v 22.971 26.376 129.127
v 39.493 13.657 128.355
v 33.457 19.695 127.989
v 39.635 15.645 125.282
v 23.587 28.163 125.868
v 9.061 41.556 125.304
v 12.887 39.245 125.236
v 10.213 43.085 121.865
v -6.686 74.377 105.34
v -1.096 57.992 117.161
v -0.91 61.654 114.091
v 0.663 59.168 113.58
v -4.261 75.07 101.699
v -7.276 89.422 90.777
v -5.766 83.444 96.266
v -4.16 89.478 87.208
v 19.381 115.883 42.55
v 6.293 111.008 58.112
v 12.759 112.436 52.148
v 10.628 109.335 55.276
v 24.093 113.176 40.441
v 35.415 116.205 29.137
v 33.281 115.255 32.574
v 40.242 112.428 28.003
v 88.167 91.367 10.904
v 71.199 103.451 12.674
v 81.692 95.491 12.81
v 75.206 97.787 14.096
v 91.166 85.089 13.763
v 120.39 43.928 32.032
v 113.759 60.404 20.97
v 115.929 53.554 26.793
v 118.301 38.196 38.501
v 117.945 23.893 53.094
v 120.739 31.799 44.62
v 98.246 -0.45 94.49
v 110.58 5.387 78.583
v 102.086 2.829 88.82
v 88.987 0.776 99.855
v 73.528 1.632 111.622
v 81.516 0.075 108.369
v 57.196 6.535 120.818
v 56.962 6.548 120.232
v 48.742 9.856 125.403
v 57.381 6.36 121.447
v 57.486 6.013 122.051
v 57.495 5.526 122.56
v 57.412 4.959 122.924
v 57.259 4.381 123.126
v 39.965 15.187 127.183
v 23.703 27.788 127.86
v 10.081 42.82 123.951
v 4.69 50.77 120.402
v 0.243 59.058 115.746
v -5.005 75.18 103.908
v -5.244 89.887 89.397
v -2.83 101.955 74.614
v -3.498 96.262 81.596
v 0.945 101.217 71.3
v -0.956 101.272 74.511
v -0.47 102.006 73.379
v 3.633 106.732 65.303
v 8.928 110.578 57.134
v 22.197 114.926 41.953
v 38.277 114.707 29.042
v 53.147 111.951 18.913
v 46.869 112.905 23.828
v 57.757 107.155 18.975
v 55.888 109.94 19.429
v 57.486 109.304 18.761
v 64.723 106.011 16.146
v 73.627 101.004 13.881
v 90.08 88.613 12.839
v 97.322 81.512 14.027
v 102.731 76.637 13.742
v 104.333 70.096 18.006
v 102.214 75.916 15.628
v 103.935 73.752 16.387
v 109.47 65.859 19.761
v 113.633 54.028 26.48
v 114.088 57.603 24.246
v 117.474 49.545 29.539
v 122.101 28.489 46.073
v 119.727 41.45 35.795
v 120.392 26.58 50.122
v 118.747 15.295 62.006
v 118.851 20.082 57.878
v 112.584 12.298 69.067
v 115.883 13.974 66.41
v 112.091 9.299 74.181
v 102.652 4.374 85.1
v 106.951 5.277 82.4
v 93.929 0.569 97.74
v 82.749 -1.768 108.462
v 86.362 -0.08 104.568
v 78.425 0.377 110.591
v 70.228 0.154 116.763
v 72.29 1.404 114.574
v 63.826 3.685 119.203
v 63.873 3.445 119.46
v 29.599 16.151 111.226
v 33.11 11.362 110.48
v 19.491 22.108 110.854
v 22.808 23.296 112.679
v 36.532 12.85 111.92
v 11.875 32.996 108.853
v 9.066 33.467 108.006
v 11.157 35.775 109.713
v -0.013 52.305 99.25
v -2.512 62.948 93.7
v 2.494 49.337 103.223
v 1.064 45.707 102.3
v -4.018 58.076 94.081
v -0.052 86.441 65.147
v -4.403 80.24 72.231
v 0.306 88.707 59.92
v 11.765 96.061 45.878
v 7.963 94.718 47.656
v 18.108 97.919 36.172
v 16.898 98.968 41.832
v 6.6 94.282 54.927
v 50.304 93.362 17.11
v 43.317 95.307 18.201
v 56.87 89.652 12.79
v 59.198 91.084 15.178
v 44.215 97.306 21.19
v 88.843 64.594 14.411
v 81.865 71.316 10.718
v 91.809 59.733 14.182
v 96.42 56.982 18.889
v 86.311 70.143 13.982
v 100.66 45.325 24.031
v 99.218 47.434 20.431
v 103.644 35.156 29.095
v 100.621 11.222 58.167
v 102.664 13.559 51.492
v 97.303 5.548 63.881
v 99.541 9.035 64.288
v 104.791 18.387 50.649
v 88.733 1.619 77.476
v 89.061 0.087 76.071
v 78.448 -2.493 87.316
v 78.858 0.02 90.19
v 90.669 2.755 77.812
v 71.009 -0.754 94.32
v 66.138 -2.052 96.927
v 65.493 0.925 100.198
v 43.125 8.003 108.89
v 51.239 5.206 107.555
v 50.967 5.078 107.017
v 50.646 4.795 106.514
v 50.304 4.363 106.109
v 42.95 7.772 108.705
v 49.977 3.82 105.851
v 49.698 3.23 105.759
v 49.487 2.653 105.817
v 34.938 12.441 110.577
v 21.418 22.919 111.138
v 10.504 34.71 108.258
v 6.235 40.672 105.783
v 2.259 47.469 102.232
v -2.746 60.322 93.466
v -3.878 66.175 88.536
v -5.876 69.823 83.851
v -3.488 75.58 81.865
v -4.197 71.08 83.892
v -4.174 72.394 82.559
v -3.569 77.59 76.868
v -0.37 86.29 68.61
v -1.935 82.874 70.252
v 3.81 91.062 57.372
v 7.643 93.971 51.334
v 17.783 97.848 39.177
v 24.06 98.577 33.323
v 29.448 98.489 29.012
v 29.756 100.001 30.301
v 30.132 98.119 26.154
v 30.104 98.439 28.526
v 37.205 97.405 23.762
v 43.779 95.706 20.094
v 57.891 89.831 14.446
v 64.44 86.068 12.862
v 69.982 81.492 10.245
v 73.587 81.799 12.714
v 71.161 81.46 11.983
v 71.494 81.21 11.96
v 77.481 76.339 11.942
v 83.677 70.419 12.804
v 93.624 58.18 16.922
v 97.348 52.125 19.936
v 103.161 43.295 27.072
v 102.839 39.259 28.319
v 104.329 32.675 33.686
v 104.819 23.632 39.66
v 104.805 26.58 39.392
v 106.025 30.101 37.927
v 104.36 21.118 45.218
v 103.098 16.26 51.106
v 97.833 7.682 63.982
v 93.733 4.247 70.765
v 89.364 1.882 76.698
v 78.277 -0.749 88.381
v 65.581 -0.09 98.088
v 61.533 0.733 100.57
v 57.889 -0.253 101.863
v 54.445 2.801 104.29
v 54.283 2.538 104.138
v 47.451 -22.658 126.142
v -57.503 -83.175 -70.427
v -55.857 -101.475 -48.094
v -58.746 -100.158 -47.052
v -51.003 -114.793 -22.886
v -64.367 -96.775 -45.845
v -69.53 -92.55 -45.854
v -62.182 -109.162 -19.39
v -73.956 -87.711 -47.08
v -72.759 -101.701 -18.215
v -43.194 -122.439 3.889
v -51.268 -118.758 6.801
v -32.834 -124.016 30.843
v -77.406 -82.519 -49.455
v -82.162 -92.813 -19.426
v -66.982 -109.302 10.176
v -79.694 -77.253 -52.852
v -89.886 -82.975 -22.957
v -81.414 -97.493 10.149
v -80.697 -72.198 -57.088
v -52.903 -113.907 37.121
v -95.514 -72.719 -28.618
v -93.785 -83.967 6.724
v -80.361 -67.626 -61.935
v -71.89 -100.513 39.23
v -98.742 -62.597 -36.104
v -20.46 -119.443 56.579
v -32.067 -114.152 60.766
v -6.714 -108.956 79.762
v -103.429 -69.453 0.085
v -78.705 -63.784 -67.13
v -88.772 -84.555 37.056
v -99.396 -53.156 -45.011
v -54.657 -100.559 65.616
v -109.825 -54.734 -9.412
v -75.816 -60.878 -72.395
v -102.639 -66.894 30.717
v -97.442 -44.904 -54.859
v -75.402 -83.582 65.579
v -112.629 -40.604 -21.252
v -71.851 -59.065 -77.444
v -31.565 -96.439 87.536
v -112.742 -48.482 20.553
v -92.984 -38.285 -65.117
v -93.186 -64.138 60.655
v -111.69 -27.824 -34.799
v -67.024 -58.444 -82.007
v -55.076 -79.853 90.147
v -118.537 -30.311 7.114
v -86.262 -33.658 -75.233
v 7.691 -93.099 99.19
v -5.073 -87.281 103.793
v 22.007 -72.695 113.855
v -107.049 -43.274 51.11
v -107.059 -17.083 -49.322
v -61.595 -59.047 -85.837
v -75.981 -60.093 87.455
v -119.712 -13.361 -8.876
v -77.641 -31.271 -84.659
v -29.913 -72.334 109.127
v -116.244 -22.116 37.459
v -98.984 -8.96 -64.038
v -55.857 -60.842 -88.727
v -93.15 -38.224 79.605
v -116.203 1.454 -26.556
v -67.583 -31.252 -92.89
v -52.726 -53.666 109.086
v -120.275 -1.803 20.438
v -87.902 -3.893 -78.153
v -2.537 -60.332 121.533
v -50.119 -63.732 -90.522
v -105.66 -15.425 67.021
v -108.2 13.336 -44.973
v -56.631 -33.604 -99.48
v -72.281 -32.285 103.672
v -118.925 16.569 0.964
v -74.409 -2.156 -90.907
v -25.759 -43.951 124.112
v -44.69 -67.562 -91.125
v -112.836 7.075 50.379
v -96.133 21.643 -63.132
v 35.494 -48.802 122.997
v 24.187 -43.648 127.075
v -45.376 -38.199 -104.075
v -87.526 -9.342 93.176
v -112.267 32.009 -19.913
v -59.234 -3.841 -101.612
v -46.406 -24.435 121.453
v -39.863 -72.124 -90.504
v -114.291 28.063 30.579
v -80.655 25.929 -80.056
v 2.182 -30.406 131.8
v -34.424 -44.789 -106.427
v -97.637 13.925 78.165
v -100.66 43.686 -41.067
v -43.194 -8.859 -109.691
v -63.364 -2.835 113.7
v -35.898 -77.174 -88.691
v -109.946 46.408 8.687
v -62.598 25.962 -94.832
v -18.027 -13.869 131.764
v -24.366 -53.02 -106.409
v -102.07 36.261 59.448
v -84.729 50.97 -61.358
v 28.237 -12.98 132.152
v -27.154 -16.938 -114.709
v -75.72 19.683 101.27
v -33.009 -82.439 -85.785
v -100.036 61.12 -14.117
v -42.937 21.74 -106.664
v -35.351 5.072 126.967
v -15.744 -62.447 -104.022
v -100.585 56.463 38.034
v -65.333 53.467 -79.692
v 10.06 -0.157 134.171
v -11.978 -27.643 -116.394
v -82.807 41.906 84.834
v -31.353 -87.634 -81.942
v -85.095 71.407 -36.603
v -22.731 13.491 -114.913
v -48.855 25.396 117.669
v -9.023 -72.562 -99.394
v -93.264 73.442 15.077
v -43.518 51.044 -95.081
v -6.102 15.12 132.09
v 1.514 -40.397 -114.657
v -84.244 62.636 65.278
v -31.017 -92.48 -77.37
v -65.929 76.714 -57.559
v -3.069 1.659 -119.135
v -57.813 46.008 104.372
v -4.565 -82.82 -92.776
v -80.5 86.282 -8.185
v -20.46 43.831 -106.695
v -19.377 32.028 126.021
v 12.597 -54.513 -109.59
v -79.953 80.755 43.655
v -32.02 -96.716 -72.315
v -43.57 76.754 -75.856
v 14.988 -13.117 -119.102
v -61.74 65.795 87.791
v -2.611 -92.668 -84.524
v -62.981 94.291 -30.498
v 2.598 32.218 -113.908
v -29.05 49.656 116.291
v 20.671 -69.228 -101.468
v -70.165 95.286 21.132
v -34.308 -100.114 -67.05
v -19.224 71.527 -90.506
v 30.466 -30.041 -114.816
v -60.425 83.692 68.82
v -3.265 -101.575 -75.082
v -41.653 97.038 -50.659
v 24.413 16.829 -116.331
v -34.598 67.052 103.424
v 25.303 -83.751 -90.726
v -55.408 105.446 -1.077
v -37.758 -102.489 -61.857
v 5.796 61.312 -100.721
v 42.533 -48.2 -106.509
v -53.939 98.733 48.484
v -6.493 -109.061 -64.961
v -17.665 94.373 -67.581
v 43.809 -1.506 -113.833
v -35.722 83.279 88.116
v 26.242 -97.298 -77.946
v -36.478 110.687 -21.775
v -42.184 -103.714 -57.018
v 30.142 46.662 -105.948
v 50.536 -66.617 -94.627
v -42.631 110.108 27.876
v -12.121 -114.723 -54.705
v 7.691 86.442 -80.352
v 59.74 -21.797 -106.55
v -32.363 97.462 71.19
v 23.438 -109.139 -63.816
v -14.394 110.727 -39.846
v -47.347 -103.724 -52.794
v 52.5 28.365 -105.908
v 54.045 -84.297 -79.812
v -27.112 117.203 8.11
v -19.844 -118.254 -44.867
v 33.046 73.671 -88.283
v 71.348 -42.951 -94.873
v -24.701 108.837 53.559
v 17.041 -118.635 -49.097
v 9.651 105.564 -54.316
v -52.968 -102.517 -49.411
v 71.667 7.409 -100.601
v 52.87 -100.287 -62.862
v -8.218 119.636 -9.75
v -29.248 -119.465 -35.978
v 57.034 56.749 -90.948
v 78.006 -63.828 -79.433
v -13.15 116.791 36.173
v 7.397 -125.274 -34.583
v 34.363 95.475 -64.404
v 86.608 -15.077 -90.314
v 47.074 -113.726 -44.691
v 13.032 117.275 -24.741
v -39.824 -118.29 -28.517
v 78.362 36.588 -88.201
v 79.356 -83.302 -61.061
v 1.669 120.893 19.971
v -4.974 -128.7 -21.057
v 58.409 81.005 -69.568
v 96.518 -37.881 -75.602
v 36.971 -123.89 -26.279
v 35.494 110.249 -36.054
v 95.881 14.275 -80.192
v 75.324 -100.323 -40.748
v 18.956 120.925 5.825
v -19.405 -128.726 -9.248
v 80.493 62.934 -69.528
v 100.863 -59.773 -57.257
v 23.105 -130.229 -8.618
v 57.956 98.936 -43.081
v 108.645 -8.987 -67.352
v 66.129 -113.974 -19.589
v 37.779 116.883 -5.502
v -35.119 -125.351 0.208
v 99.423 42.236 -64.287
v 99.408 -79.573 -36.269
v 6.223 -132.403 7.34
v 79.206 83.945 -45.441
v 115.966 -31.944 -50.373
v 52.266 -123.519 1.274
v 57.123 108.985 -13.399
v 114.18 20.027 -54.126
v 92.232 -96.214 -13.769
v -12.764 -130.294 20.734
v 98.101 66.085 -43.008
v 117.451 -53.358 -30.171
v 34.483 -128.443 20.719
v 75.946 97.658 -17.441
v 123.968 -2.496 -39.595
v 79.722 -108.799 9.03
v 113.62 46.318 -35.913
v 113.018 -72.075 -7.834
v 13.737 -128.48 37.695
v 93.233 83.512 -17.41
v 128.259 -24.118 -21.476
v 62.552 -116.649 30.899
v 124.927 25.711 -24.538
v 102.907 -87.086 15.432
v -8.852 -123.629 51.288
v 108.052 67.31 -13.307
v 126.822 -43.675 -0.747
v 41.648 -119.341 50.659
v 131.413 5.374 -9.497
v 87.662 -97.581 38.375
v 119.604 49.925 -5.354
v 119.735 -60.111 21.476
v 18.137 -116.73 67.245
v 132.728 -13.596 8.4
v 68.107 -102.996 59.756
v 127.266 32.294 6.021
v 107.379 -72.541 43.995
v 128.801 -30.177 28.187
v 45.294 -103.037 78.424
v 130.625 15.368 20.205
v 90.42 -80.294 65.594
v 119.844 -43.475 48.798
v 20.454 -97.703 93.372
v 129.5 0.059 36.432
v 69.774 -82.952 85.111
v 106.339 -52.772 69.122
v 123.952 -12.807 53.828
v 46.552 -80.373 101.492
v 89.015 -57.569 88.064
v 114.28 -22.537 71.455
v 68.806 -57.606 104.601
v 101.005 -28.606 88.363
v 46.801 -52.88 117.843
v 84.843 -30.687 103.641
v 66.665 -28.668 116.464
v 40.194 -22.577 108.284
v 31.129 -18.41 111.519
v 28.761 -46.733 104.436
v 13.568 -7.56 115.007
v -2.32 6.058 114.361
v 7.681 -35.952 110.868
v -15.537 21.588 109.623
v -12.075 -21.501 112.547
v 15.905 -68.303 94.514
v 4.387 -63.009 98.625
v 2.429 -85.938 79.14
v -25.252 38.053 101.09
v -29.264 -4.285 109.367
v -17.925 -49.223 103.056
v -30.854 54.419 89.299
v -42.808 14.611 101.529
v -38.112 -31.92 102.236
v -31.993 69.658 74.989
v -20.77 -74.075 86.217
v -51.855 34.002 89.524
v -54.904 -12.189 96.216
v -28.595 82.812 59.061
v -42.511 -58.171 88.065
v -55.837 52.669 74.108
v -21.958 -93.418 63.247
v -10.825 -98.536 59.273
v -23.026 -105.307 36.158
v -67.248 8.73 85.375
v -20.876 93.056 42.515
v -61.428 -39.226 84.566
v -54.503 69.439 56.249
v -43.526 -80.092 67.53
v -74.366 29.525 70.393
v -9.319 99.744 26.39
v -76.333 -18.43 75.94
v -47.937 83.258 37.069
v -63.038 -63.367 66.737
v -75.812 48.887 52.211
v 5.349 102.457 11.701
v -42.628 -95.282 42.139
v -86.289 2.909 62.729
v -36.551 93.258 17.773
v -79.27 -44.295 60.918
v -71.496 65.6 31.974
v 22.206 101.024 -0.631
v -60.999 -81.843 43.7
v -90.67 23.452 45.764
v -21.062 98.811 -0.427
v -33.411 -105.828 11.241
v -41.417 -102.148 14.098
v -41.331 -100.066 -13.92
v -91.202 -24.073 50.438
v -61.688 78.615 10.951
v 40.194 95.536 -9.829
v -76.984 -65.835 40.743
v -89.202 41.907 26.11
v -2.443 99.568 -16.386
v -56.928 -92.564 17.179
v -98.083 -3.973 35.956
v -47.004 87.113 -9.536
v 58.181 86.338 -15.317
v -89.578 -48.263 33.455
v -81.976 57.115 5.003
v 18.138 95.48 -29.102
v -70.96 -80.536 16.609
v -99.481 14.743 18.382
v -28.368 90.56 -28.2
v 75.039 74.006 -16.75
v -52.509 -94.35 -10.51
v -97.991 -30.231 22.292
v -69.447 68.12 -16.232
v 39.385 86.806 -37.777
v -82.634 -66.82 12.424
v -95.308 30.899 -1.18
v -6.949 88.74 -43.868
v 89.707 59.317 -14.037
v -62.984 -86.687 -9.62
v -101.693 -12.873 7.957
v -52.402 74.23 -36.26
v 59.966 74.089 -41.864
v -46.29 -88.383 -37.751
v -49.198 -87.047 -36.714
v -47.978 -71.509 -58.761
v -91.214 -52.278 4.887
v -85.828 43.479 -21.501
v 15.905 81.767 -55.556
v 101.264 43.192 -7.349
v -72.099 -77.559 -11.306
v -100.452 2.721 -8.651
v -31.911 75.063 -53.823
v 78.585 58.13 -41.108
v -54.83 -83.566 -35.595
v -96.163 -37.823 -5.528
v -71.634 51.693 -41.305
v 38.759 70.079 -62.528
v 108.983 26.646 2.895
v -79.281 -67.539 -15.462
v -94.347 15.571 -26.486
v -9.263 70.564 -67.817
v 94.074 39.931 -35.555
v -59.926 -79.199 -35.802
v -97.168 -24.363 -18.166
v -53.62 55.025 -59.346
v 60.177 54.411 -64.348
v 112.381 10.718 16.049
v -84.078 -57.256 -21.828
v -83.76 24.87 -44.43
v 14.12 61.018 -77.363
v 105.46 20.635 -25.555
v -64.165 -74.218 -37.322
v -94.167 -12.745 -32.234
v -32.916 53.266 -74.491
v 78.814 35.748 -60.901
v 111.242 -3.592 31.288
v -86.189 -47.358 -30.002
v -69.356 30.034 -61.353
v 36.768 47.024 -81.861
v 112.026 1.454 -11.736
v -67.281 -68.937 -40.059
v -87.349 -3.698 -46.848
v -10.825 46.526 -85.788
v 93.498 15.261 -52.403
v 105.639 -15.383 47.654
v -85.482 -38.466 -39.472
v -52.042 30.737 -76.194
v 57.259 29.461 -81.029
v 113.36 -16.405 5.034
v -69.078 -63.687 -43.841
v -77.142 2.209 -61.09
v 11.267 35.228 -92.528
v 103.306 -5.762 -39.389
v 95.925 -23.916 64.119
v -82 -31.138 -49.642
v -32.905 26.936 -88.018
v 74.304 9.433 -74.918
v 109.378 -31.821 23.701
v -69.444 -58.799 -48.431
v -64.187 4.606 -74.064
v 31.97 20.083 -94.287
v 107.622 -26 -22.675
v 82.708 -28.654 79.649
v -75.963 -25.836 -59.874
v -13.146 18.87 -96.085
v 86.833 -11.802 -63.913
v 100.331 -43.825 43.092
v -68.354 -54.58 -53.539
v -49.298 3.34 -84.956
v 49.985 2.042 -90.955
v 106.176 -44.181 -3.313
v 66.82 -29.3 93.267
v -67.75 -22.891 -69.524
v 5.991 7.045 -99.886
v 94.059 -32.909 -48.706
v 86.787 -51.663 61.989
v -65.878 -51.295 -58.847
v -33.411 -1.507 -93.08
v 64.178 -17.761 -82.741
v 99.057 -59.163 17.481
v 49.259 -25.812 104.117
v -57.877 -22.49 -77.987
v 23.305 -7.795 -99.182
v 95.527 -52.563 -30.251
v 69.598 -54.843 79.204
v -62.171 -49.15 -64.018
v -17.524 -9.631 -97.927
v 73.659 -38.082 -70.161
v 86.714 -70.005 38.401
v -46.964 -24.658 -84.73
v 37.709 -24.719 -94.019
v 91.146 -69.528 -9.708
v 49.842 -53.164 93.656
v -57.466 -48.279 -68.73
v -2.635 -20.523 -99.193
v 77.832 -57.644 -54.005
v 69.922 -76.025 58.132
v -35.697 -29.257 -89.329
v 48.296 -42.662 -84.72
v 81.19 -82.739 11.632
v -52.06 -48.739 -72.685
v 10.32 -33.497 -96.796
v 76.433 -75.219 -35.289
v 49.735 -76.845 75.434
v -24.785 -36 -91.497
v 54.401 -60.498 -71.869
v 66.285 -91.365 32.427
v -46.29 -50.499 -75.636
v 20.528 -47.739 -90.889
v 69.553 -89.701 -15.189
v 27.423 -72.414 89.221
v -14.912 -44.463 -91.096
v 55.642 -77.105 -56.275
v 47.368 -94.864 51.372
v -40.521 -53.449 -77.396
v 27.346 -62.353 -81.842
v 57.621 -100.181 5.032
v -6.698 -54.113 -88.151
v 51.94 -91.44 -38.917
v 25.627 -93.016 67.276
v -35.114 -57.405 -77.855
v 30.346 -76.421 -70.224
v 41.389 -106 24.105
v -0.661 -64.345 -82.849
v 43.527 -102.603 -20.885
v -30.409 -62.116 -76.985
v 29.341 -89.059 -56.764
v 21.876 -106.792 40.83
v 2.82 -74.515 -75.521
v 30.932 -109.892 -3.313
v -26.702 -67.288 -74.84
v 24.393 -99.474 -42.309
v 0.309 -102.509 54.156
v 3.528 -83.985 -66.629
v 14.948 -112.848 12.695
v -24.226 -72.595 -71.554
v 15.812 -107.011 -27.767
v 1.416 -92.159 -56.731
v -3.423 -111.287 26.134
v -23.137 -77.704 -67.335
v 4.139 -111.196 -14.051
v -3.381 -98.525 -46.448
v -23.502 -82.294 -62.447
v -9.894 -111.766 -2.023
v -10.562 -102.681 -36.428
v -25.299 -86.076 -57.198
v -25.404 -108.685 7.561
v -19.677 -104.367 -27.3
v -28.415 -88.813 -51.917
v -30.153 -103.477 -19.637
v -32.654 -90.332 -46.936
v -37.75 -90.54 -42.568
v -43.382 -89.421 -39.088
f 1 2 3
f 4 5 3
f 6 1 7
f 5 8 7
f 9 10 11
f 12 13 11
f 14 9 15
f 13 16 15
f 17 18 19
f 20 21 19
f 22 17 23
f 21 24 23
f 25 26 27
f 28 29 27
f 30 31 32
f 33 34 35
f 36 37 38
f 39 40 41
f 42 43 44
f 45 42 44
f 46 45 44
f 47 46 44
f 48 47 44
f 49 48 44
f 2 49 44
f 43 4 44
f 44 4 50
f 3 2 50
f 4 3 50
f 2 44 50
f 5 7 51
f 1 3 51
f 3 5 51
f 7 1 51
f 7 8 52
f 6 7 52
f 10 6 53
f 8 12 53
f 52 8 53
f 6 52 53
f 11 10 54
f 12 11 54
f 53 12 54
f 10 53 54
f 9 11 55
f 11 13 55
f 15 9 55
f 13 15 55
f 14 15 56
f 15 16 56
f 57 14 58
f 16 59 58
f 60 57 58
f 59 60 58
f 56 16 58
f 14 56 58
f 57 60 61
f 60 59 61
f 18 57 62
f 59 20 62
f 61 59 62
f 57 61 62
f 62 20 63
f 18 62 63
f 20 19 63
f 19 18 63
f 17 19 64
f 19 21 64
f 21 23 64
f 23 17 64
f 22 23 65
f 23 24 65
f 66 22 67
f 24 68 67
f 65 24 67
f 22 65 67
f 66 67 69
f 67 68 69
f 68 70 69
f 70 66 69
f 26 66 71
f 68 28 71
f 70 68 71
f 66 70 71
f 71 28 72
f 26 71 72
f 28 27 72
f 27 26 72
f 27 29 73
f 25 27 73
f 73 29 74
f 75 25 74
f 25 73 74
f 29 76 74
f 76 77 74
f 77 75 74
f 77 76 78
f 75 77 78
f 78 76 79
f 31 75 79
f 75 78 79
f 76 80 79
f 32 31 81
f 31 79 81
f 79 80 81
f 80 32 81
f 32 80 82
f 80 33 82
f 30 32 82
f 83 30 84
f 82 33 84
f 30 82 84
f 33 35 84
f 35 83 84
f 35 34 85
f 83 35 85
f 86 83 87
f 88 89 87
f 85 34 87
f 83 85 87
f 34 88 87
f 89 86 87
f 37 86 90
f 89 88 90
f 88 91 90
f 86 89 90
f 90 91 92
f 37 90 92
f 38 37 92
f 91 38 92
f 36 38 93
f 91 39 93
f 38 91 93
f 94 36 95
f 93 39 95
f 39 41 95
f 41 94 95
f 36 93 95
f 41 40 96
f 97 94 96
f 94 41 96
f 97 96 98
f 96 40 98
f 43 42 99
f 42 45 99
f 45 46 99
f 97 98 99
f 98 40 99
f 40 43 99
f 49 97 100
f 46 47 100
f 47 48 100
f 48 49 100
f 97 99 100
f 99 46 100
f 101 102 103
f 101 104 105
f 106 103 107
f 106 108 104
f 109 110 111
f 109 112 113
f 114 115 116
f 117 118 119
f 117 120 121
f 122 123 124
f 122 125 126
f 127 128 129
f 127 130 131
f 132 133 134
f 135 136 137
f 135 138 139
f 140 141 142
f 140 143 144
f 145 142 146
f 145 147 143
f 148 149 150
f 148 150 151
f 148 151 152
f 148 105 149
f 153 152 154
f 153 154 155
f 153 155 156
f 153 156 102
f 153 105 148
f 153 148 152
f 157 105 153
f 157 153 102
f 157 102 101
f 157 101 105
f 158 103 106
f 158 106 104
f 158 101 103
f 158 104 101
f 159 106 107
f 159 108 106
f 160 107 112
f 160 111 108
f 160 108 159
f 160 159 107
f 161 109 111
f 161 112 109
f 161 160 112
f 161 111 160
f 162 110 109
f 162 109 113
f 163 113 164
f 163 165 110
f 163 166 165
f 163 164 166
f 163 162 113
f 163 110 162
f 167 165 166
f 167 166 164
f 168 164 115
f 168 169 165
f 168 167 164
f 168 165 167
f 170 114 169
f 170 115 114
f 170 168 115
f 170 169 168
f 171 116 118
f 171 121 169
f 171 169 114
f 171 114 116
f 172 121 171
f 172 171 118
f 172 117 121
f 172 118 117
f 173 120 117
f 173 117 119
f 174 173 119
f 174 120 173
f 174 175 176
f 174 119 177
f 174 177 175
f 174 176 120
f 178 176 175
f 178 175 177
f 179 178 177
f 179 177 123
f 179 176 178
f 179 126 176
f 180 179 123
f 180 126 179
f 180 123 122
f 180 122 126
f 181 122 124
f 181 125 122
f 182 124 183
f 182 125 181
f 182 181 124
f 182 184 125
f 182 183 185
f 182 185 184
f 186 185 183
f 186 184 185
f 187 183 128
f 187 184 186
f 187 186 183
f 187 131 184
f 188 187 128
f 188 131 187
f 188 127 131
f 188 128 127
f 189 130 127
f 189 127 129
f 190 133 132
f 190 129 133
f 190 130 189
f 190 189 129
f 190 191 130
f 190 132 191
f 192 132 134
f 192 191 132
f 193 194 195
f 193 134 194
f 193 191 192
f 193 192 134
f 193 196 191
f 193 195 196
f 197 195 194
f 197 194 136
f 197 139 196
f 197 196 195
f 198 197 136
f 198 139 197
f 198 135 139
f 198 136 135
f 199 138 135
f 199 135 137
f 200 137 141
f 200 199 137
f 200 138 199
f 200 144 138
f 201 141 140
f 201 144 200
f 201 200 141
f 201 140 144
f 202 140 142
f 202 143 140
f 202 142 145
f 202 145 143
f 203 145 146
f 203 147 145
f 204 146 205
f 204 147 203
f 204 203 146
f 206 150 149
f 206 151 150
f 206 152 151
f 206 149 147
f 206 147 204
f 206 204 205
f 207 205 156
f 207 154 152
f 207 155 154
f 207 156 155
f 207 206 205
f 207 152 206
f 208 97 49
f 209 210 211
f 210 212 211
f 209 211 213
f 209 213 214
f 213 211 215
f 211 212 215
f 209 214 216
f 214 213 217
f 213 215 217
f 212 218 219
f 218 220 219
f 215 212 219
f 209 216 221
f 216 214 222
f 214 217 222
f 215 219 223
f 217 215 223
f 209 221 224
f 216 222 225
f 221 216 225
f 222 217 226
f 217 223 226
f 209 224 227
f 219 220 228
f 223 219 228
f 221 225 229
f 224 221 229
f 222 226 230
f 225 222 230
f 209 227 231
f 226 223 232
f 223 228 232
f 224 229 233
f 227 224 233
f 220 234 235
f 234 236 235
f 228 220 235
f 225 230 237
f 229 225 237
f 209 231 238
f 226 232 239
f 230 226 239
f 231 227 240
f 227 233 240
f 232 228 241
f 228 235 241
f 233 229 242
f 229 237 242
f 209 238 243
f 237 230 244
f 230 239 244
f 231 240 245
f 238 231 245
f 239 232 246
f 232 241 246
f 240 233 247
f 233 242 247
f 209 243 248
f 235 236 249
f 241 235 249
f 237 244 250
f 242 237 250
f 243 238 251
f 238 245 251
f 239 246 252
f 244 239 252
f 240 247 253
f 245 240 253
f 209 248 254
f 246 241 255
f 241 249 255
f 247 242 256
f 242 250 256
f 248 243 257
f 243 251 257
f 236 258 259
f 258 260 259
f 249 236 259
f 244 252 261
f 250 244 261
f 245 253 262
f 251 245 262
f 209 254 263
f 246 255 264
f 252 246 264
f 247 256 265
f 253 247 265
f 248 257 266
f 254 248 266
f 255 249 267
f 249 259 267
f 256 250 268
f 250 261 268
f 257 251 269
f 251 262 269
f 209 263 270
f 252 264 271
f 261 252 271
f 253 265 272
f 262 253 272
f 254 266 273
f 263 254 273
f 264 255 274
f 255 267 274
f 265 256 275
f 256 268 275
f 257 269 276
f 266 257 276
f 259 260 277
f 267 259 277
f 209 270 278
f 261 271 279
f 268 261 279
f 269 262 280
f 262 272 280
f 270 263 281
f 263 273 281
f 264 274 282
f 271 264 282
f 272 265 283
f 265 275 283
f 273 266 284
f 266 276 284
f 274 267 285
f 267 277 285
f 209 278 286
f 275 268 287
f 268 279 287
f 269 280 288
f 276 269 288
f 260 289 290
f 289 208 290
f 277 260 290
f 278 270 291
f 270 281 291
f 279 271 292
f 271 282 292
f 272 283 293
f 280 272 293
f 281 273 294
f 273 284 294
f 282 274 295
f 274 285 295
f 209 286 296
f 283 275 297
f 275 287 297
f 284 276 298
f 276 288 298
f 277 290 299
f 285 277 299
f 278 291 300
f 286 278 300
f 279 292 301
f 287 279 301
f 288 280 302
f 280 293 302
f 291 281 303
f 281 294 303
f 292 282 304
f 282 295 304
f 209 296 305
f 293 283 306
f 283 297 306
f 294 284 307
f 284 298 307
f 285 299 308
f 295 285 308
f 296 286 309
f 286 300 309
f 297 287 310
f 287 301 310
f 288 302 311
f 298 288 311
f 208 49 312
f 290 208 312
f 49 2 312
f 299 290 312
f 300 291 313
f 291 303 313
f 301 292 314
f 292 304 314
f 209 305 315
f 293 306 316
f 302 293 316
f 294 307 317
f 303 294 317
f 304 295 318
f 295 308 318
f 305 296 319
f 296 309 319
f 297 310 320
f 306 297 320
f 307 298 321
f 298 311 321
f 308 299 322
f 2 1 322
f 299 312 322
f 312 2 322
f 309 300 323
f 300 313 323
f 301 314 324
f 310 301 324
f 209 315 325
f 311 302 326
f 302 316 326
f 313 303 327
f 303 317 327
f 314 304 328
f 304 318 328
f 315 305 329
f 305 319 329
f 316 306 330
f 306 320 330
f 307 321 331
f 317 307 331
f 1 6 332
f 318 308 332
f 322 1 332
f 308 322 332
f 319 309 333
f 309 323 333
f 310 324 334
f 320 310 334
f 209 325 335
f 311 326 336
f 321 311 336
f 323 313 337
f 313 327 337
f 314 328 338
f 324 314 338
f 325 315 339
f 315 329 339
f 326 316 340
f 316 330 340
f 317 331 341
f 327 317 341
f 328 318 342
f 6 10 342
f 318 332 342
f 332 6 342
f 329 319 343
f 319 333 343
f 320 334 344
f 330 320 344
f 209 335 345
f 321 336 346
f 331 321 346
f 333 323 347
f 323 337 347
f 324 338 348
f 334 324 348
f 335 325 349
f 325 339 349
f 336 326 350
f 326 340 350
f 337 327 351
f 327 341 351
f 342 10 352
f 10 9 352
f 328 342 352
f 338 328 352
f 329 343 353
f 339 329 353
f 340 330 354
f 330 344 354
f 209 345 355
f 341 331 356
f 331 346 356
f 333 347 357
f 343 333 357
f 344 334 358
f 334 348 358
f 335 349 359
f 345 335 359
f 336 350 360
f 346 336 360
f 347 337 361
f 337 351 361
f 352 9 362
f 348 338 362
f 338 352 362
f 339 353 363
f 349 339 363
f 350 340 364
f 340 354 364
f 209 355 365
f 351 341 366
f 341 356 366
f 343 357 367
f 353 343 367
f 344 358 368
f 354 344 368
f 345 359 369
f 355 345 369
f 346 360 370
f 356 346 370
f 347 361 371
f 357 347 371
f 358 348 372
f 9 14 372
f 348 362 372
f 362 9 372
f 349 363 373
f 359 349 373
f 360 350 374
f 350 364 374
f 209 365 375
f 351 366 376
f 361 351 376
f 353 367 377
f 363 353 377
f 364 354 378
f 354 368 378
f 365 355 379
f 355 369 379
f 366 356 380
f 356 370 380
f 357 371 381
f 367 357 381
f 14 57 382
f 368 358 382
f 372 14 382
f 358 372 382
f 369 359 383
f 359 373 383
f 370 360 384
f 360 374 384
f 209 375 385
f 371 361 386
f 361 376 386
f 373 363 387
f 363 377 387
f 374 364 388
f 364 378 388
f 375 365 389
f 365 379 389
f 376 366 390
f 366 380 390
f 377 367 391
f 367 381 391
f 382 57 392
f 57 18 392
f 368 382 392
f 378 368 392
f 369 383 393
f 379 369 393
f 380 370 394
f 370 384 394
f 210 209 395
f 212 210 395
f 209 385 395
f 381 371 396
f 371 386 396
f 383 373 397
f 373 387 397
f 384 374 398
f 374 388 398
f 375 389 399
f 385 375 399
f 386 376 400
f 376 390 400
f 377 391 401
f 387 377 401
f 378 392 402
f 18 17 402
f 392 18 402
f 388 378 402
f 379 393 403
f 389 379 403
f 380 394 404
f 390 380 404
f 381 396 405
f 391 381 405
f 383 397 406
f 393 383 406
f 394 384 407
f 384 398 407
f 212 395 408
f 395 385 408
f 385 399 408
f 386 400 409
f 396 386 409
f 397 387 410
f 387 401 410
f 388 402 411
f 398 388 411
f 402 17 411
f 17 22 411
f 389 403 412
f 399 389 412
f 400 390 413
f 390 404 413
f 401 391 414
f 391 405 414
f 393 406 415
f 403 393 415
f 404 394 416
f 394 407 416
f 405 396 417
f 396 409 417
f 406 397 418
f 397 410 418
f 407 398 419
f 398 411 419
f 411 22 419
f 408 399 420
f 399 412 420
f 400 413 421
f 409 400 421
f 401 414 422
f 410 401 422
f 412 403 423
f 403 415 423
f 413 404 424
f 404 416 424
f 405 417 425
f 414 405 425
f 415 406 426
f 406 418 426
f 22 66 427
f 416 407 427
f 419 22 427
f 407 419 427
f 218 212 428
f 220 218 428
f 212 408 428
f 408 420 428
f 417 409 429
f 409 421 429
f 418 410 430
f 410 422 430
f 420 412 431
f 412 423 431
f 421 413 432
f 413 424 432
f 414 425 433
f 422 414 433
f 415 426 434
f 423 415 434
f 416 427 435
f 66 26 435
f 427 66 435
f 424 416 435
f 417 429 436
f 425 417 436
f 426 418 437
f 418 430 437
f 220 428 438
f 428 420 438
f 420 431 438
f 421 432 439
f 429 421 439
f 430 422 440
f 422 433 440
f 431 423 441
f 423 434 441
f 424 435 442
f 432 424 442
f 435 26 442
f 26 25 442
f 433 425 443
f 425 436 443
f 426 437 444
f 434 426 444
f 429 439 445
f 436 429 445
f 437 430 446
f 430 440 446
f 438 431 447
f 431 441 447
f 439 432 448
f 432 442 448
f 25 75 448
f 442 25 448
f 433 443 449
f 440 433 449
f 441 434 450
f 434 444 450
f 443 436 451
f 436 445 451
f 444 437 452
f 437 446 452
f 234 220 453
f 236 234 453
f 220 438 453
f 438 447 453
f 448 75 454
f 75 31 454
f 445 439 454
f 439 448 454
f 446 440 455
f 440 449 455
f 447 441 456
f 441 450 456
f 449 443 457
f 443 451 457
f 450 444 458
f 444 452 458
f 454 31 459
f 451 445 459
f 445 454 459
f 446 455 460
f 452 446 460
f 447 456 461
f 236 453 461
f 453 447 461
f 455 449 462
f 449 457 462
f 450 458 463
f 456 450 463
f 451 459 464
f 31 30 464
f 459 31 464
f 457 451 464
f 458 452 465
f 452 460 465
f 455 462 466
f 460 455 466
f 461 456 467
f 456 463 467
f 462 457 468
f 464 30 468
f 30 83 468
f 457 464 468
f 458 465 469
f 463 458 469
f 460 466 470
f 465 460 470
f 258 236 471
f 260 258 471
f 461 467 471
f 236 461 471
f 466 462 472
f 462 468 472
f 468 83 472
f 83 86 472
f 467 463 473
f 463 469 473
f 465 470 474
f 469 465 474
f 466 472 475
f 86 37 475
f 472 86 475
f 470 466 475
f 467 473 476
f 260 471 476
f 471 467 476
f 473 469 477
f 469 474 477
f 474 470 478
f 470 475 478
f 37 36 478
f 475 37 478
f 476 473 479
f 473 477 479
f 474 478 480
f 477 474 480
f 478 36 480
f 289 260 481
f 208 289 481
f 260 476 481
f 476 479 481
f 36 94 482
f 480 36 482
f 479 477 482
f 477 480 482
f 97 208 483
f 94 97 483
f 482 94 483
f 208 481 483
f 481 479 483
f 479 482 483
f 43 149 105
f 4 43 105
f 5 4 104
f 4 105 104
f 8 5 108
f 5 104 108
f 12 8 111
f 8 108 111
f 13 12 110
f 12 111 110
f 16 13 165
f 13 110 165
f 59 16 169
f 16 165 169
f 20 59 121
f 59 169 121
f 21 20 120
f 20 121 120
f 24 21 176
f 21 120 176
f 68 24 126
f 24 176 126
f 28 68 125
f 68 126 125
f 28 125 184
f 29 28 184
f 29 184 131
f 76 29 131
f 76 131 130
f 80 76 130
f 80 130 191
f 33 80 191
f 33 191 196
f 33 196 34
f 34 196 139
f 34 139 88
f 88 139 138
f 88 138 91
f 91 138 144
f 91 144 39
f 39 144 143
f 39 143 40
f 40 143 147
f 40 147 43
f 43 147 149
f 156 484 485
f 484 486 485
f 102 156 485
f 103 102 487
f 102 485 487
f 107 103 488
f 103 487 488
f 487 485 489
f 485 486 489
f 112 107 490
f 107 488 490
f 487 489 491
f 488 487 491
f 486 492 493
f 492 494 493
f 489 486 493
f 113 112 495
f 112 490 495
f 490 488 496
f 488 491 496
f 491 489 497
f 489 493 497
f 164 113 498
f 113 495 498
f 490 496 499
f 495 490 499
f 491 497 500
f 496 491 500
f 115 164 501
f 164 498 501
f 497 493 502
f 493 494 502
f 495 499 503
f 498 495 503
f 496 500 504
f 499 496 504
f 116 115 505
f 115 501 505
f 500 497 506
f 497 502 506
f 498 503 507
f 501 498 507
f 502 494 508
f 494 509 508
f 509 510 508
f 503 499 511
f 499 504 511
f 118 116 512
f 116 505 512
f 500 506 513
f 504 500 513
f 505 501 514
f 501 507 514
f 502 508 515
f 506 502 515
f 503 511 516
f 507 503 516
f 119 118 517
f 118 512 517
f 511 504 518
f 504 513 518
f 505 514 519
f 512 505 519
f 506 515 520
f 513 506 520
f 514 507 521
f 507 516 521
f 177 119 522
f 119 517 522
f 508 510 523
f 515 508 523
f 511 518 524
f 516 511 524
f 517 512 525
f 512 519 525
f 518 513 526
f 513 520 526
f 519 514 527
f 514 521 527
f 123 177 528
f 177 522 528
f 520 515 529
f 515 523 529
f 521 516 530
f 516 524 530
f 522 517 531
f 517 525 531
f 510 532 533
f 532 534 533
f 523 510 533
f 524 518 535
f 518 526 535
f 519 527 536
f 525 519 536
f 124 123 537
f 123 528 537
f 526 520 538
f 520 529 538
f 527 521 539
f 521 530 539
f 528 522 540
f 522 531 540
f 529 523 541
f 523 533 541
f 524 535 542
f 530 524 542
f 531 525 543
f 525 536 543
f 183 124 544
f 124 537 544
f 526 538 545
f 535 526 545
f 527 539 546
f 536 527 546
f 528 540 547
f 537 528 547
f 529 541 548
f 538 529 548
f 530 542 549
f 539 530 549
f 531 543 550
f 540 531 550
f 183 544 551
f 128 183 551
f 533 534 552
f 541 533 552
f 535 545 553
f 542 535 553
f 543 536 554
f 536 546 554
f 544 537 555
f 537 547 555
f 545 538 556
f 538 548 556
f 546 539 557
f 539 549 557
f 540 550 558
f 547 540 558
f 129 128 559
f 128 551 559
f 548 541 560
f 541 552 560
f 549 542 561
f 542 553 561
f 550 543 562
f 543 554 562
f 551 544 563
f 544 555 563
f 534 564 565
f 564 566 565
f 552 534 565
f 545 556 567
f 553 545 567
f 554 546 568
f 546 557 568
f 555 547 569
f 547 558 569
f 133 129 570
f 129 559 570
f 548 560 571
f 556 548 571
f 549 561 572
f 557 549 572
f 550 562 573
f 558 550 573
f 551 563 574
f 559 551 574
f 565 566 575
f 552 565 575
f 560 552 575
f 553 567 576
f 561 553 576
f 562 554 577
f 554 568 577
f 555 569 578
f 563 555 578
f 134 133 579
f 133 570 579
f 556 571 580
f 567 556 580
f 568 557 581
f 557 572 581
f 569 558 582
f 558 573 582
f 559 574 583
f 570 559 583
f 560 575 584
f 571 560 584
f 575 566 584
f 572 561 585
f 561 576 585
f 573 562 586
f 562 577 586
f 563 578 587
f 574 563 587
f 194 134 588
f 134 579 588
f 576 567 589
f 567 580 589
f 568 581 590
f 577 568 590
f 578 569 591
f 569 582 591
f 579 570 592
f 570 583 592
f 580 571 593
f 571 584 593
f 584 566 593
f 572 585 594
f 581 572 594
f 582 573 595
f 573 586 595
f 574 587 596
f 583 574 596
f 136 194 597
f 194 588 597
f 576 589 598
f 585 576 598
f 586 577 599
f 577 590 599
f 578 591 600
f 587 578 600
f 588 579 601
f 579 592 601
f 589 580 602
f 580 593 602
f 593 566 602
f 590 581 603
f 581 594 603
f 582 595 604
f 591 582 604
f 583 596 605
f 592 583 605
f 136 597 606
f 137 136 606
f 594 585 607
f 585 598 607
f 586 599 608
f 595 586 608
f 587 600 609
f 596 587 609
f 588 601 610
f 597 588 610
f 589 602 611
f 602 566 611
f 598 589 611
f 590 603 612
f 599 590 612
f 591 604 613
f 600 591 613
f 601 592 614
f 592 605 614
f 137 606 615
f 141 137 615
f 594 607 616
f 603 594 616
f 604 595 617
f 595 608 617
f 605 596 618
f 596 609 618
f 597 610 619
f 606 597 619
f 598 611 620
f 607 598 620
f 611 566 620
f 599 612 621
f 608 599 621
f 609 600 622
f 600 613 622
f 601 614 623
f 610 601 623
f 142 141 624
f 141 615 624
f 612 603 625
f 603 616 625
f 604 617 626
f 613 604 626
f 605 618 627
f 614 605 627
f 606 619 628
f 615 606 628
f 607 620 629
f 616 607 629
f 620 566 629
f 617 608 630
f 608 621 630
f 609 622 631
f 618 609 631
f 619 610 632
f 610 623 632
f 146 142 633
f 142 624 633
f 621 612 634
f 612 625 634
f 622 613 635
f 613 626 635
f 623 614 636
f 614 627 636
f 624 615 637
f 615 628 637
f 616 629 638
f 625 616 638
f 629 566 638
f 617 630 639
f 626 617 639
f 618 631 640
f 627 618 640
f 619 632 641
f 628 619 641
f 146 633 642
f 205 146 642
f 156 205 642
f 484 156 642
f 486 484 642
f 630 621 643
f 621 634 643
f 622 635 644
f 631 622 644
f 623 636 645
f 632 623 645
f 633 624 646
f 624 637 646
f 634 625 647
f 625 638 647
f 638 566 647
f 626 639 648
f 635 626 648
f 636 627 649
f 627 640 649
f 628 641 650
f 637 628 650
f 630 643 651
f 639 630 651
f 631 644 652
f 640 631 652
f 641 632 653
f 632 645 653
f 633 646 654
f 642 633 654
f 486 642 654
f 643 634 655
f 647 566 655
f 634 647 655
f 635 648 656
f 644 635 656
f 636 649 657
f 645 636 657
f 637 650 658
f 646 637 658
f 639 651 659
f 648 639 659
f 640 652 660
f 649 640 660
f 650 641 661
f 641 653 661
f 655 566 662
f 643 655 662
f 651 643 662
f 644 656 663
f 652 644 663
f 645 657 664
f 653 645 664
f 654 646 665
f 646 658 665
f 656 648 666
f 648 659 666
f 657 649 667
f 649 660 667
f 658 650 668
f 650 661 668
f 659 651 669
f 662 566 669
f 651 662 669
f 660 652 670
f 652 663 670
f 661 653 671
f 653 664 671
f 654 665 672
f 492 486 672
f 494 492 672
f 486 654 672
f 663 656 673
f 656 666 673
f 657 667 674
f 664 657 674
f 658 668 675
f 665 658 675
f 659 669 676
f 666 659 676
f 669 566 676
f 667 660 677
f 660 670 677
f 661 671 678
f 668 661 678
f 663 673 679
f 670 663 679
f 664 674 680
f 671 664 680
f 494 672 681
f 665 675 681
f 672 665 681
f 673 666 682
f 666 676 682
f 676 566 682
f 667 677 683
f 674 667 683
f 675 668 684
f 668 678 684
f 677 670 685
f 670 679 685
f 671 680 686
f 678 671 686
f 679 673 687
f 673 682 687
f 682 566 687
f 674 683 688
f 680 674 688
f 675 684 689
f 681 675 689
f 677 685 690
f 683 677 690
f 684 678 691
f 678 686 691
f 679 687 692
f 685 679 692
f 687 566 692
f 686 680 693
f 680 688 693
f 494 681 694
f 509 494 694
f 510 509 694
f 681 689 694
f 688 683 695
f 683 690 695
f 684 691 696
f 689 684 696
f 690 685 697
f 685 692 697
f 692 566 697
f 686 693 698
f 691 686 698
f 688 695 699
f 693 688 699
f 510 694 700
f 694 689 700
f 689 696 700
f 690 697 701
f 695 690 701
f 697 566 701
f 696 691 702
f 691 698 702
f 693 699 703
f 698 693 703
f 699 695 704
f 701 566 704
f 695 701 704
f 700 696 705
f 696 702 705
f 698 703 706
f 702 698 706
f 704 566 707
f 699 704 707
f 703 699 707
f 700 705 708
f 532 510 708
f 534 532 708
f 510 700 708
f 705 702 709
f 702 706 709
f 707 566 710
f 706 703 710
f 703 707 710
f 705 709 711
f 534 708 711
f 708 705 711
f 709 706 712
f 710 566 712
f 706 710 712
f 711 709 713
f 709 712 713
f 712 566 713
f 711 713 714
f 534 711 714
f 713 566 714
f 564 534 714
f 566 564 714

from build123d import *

# Parameters (mm, degrees)
FILLET1_R             = 2.54
BODY_MOVE_COPY1_ANGLE = 53.647435276


with BuildPart() as part:
    # Sketch1 → Revolve5 (revolve)
    with BuildSketch(Plane(origin=(0, 0, 0), x_dir=(0, 0, -1), z_dir=(1, 0, 0))):
        with BuildLine():
            Line((-72.844207417, 103.278008147), (-61.917576304, 87.673161704))
            ThreePointArc((-61.917576304, 87.673161704), (-102.953744833, -33.215492534), (0, -108.704301477))
            Line((0, -108.704301477), (0, -127.754301477))
            ThreePointArc((0, -127.754301477), (-121.122052745, -38.943938014), (-72.844207417, 103.278008147))
        make_face()
    revolve(axis=Axis((0, 75.583831792, 0), (0, -1, 0)))

    # Fillet1
    fillet1_edges = [part.edges().sort_by_distance(p)[0] for p in [
        (0, 103.278008147, -72.844207417),
        (0, 87.673161704, -61.917576304),
    ]]
    fillet(fillet1_edges, radius=FILLET1_R)


with BuildPart() as part_1:
    # Body-Move/Copy1: moved
    add(part.part.moved(Location((0, 0, 0))).rotate(Axis((2.292010946, -12.133386001, -1.482671109), (0.819160725, 0.219493455, -0.529904076)), BODY_MOVE_COPY1_ANGLE))


solid = part_1.part
